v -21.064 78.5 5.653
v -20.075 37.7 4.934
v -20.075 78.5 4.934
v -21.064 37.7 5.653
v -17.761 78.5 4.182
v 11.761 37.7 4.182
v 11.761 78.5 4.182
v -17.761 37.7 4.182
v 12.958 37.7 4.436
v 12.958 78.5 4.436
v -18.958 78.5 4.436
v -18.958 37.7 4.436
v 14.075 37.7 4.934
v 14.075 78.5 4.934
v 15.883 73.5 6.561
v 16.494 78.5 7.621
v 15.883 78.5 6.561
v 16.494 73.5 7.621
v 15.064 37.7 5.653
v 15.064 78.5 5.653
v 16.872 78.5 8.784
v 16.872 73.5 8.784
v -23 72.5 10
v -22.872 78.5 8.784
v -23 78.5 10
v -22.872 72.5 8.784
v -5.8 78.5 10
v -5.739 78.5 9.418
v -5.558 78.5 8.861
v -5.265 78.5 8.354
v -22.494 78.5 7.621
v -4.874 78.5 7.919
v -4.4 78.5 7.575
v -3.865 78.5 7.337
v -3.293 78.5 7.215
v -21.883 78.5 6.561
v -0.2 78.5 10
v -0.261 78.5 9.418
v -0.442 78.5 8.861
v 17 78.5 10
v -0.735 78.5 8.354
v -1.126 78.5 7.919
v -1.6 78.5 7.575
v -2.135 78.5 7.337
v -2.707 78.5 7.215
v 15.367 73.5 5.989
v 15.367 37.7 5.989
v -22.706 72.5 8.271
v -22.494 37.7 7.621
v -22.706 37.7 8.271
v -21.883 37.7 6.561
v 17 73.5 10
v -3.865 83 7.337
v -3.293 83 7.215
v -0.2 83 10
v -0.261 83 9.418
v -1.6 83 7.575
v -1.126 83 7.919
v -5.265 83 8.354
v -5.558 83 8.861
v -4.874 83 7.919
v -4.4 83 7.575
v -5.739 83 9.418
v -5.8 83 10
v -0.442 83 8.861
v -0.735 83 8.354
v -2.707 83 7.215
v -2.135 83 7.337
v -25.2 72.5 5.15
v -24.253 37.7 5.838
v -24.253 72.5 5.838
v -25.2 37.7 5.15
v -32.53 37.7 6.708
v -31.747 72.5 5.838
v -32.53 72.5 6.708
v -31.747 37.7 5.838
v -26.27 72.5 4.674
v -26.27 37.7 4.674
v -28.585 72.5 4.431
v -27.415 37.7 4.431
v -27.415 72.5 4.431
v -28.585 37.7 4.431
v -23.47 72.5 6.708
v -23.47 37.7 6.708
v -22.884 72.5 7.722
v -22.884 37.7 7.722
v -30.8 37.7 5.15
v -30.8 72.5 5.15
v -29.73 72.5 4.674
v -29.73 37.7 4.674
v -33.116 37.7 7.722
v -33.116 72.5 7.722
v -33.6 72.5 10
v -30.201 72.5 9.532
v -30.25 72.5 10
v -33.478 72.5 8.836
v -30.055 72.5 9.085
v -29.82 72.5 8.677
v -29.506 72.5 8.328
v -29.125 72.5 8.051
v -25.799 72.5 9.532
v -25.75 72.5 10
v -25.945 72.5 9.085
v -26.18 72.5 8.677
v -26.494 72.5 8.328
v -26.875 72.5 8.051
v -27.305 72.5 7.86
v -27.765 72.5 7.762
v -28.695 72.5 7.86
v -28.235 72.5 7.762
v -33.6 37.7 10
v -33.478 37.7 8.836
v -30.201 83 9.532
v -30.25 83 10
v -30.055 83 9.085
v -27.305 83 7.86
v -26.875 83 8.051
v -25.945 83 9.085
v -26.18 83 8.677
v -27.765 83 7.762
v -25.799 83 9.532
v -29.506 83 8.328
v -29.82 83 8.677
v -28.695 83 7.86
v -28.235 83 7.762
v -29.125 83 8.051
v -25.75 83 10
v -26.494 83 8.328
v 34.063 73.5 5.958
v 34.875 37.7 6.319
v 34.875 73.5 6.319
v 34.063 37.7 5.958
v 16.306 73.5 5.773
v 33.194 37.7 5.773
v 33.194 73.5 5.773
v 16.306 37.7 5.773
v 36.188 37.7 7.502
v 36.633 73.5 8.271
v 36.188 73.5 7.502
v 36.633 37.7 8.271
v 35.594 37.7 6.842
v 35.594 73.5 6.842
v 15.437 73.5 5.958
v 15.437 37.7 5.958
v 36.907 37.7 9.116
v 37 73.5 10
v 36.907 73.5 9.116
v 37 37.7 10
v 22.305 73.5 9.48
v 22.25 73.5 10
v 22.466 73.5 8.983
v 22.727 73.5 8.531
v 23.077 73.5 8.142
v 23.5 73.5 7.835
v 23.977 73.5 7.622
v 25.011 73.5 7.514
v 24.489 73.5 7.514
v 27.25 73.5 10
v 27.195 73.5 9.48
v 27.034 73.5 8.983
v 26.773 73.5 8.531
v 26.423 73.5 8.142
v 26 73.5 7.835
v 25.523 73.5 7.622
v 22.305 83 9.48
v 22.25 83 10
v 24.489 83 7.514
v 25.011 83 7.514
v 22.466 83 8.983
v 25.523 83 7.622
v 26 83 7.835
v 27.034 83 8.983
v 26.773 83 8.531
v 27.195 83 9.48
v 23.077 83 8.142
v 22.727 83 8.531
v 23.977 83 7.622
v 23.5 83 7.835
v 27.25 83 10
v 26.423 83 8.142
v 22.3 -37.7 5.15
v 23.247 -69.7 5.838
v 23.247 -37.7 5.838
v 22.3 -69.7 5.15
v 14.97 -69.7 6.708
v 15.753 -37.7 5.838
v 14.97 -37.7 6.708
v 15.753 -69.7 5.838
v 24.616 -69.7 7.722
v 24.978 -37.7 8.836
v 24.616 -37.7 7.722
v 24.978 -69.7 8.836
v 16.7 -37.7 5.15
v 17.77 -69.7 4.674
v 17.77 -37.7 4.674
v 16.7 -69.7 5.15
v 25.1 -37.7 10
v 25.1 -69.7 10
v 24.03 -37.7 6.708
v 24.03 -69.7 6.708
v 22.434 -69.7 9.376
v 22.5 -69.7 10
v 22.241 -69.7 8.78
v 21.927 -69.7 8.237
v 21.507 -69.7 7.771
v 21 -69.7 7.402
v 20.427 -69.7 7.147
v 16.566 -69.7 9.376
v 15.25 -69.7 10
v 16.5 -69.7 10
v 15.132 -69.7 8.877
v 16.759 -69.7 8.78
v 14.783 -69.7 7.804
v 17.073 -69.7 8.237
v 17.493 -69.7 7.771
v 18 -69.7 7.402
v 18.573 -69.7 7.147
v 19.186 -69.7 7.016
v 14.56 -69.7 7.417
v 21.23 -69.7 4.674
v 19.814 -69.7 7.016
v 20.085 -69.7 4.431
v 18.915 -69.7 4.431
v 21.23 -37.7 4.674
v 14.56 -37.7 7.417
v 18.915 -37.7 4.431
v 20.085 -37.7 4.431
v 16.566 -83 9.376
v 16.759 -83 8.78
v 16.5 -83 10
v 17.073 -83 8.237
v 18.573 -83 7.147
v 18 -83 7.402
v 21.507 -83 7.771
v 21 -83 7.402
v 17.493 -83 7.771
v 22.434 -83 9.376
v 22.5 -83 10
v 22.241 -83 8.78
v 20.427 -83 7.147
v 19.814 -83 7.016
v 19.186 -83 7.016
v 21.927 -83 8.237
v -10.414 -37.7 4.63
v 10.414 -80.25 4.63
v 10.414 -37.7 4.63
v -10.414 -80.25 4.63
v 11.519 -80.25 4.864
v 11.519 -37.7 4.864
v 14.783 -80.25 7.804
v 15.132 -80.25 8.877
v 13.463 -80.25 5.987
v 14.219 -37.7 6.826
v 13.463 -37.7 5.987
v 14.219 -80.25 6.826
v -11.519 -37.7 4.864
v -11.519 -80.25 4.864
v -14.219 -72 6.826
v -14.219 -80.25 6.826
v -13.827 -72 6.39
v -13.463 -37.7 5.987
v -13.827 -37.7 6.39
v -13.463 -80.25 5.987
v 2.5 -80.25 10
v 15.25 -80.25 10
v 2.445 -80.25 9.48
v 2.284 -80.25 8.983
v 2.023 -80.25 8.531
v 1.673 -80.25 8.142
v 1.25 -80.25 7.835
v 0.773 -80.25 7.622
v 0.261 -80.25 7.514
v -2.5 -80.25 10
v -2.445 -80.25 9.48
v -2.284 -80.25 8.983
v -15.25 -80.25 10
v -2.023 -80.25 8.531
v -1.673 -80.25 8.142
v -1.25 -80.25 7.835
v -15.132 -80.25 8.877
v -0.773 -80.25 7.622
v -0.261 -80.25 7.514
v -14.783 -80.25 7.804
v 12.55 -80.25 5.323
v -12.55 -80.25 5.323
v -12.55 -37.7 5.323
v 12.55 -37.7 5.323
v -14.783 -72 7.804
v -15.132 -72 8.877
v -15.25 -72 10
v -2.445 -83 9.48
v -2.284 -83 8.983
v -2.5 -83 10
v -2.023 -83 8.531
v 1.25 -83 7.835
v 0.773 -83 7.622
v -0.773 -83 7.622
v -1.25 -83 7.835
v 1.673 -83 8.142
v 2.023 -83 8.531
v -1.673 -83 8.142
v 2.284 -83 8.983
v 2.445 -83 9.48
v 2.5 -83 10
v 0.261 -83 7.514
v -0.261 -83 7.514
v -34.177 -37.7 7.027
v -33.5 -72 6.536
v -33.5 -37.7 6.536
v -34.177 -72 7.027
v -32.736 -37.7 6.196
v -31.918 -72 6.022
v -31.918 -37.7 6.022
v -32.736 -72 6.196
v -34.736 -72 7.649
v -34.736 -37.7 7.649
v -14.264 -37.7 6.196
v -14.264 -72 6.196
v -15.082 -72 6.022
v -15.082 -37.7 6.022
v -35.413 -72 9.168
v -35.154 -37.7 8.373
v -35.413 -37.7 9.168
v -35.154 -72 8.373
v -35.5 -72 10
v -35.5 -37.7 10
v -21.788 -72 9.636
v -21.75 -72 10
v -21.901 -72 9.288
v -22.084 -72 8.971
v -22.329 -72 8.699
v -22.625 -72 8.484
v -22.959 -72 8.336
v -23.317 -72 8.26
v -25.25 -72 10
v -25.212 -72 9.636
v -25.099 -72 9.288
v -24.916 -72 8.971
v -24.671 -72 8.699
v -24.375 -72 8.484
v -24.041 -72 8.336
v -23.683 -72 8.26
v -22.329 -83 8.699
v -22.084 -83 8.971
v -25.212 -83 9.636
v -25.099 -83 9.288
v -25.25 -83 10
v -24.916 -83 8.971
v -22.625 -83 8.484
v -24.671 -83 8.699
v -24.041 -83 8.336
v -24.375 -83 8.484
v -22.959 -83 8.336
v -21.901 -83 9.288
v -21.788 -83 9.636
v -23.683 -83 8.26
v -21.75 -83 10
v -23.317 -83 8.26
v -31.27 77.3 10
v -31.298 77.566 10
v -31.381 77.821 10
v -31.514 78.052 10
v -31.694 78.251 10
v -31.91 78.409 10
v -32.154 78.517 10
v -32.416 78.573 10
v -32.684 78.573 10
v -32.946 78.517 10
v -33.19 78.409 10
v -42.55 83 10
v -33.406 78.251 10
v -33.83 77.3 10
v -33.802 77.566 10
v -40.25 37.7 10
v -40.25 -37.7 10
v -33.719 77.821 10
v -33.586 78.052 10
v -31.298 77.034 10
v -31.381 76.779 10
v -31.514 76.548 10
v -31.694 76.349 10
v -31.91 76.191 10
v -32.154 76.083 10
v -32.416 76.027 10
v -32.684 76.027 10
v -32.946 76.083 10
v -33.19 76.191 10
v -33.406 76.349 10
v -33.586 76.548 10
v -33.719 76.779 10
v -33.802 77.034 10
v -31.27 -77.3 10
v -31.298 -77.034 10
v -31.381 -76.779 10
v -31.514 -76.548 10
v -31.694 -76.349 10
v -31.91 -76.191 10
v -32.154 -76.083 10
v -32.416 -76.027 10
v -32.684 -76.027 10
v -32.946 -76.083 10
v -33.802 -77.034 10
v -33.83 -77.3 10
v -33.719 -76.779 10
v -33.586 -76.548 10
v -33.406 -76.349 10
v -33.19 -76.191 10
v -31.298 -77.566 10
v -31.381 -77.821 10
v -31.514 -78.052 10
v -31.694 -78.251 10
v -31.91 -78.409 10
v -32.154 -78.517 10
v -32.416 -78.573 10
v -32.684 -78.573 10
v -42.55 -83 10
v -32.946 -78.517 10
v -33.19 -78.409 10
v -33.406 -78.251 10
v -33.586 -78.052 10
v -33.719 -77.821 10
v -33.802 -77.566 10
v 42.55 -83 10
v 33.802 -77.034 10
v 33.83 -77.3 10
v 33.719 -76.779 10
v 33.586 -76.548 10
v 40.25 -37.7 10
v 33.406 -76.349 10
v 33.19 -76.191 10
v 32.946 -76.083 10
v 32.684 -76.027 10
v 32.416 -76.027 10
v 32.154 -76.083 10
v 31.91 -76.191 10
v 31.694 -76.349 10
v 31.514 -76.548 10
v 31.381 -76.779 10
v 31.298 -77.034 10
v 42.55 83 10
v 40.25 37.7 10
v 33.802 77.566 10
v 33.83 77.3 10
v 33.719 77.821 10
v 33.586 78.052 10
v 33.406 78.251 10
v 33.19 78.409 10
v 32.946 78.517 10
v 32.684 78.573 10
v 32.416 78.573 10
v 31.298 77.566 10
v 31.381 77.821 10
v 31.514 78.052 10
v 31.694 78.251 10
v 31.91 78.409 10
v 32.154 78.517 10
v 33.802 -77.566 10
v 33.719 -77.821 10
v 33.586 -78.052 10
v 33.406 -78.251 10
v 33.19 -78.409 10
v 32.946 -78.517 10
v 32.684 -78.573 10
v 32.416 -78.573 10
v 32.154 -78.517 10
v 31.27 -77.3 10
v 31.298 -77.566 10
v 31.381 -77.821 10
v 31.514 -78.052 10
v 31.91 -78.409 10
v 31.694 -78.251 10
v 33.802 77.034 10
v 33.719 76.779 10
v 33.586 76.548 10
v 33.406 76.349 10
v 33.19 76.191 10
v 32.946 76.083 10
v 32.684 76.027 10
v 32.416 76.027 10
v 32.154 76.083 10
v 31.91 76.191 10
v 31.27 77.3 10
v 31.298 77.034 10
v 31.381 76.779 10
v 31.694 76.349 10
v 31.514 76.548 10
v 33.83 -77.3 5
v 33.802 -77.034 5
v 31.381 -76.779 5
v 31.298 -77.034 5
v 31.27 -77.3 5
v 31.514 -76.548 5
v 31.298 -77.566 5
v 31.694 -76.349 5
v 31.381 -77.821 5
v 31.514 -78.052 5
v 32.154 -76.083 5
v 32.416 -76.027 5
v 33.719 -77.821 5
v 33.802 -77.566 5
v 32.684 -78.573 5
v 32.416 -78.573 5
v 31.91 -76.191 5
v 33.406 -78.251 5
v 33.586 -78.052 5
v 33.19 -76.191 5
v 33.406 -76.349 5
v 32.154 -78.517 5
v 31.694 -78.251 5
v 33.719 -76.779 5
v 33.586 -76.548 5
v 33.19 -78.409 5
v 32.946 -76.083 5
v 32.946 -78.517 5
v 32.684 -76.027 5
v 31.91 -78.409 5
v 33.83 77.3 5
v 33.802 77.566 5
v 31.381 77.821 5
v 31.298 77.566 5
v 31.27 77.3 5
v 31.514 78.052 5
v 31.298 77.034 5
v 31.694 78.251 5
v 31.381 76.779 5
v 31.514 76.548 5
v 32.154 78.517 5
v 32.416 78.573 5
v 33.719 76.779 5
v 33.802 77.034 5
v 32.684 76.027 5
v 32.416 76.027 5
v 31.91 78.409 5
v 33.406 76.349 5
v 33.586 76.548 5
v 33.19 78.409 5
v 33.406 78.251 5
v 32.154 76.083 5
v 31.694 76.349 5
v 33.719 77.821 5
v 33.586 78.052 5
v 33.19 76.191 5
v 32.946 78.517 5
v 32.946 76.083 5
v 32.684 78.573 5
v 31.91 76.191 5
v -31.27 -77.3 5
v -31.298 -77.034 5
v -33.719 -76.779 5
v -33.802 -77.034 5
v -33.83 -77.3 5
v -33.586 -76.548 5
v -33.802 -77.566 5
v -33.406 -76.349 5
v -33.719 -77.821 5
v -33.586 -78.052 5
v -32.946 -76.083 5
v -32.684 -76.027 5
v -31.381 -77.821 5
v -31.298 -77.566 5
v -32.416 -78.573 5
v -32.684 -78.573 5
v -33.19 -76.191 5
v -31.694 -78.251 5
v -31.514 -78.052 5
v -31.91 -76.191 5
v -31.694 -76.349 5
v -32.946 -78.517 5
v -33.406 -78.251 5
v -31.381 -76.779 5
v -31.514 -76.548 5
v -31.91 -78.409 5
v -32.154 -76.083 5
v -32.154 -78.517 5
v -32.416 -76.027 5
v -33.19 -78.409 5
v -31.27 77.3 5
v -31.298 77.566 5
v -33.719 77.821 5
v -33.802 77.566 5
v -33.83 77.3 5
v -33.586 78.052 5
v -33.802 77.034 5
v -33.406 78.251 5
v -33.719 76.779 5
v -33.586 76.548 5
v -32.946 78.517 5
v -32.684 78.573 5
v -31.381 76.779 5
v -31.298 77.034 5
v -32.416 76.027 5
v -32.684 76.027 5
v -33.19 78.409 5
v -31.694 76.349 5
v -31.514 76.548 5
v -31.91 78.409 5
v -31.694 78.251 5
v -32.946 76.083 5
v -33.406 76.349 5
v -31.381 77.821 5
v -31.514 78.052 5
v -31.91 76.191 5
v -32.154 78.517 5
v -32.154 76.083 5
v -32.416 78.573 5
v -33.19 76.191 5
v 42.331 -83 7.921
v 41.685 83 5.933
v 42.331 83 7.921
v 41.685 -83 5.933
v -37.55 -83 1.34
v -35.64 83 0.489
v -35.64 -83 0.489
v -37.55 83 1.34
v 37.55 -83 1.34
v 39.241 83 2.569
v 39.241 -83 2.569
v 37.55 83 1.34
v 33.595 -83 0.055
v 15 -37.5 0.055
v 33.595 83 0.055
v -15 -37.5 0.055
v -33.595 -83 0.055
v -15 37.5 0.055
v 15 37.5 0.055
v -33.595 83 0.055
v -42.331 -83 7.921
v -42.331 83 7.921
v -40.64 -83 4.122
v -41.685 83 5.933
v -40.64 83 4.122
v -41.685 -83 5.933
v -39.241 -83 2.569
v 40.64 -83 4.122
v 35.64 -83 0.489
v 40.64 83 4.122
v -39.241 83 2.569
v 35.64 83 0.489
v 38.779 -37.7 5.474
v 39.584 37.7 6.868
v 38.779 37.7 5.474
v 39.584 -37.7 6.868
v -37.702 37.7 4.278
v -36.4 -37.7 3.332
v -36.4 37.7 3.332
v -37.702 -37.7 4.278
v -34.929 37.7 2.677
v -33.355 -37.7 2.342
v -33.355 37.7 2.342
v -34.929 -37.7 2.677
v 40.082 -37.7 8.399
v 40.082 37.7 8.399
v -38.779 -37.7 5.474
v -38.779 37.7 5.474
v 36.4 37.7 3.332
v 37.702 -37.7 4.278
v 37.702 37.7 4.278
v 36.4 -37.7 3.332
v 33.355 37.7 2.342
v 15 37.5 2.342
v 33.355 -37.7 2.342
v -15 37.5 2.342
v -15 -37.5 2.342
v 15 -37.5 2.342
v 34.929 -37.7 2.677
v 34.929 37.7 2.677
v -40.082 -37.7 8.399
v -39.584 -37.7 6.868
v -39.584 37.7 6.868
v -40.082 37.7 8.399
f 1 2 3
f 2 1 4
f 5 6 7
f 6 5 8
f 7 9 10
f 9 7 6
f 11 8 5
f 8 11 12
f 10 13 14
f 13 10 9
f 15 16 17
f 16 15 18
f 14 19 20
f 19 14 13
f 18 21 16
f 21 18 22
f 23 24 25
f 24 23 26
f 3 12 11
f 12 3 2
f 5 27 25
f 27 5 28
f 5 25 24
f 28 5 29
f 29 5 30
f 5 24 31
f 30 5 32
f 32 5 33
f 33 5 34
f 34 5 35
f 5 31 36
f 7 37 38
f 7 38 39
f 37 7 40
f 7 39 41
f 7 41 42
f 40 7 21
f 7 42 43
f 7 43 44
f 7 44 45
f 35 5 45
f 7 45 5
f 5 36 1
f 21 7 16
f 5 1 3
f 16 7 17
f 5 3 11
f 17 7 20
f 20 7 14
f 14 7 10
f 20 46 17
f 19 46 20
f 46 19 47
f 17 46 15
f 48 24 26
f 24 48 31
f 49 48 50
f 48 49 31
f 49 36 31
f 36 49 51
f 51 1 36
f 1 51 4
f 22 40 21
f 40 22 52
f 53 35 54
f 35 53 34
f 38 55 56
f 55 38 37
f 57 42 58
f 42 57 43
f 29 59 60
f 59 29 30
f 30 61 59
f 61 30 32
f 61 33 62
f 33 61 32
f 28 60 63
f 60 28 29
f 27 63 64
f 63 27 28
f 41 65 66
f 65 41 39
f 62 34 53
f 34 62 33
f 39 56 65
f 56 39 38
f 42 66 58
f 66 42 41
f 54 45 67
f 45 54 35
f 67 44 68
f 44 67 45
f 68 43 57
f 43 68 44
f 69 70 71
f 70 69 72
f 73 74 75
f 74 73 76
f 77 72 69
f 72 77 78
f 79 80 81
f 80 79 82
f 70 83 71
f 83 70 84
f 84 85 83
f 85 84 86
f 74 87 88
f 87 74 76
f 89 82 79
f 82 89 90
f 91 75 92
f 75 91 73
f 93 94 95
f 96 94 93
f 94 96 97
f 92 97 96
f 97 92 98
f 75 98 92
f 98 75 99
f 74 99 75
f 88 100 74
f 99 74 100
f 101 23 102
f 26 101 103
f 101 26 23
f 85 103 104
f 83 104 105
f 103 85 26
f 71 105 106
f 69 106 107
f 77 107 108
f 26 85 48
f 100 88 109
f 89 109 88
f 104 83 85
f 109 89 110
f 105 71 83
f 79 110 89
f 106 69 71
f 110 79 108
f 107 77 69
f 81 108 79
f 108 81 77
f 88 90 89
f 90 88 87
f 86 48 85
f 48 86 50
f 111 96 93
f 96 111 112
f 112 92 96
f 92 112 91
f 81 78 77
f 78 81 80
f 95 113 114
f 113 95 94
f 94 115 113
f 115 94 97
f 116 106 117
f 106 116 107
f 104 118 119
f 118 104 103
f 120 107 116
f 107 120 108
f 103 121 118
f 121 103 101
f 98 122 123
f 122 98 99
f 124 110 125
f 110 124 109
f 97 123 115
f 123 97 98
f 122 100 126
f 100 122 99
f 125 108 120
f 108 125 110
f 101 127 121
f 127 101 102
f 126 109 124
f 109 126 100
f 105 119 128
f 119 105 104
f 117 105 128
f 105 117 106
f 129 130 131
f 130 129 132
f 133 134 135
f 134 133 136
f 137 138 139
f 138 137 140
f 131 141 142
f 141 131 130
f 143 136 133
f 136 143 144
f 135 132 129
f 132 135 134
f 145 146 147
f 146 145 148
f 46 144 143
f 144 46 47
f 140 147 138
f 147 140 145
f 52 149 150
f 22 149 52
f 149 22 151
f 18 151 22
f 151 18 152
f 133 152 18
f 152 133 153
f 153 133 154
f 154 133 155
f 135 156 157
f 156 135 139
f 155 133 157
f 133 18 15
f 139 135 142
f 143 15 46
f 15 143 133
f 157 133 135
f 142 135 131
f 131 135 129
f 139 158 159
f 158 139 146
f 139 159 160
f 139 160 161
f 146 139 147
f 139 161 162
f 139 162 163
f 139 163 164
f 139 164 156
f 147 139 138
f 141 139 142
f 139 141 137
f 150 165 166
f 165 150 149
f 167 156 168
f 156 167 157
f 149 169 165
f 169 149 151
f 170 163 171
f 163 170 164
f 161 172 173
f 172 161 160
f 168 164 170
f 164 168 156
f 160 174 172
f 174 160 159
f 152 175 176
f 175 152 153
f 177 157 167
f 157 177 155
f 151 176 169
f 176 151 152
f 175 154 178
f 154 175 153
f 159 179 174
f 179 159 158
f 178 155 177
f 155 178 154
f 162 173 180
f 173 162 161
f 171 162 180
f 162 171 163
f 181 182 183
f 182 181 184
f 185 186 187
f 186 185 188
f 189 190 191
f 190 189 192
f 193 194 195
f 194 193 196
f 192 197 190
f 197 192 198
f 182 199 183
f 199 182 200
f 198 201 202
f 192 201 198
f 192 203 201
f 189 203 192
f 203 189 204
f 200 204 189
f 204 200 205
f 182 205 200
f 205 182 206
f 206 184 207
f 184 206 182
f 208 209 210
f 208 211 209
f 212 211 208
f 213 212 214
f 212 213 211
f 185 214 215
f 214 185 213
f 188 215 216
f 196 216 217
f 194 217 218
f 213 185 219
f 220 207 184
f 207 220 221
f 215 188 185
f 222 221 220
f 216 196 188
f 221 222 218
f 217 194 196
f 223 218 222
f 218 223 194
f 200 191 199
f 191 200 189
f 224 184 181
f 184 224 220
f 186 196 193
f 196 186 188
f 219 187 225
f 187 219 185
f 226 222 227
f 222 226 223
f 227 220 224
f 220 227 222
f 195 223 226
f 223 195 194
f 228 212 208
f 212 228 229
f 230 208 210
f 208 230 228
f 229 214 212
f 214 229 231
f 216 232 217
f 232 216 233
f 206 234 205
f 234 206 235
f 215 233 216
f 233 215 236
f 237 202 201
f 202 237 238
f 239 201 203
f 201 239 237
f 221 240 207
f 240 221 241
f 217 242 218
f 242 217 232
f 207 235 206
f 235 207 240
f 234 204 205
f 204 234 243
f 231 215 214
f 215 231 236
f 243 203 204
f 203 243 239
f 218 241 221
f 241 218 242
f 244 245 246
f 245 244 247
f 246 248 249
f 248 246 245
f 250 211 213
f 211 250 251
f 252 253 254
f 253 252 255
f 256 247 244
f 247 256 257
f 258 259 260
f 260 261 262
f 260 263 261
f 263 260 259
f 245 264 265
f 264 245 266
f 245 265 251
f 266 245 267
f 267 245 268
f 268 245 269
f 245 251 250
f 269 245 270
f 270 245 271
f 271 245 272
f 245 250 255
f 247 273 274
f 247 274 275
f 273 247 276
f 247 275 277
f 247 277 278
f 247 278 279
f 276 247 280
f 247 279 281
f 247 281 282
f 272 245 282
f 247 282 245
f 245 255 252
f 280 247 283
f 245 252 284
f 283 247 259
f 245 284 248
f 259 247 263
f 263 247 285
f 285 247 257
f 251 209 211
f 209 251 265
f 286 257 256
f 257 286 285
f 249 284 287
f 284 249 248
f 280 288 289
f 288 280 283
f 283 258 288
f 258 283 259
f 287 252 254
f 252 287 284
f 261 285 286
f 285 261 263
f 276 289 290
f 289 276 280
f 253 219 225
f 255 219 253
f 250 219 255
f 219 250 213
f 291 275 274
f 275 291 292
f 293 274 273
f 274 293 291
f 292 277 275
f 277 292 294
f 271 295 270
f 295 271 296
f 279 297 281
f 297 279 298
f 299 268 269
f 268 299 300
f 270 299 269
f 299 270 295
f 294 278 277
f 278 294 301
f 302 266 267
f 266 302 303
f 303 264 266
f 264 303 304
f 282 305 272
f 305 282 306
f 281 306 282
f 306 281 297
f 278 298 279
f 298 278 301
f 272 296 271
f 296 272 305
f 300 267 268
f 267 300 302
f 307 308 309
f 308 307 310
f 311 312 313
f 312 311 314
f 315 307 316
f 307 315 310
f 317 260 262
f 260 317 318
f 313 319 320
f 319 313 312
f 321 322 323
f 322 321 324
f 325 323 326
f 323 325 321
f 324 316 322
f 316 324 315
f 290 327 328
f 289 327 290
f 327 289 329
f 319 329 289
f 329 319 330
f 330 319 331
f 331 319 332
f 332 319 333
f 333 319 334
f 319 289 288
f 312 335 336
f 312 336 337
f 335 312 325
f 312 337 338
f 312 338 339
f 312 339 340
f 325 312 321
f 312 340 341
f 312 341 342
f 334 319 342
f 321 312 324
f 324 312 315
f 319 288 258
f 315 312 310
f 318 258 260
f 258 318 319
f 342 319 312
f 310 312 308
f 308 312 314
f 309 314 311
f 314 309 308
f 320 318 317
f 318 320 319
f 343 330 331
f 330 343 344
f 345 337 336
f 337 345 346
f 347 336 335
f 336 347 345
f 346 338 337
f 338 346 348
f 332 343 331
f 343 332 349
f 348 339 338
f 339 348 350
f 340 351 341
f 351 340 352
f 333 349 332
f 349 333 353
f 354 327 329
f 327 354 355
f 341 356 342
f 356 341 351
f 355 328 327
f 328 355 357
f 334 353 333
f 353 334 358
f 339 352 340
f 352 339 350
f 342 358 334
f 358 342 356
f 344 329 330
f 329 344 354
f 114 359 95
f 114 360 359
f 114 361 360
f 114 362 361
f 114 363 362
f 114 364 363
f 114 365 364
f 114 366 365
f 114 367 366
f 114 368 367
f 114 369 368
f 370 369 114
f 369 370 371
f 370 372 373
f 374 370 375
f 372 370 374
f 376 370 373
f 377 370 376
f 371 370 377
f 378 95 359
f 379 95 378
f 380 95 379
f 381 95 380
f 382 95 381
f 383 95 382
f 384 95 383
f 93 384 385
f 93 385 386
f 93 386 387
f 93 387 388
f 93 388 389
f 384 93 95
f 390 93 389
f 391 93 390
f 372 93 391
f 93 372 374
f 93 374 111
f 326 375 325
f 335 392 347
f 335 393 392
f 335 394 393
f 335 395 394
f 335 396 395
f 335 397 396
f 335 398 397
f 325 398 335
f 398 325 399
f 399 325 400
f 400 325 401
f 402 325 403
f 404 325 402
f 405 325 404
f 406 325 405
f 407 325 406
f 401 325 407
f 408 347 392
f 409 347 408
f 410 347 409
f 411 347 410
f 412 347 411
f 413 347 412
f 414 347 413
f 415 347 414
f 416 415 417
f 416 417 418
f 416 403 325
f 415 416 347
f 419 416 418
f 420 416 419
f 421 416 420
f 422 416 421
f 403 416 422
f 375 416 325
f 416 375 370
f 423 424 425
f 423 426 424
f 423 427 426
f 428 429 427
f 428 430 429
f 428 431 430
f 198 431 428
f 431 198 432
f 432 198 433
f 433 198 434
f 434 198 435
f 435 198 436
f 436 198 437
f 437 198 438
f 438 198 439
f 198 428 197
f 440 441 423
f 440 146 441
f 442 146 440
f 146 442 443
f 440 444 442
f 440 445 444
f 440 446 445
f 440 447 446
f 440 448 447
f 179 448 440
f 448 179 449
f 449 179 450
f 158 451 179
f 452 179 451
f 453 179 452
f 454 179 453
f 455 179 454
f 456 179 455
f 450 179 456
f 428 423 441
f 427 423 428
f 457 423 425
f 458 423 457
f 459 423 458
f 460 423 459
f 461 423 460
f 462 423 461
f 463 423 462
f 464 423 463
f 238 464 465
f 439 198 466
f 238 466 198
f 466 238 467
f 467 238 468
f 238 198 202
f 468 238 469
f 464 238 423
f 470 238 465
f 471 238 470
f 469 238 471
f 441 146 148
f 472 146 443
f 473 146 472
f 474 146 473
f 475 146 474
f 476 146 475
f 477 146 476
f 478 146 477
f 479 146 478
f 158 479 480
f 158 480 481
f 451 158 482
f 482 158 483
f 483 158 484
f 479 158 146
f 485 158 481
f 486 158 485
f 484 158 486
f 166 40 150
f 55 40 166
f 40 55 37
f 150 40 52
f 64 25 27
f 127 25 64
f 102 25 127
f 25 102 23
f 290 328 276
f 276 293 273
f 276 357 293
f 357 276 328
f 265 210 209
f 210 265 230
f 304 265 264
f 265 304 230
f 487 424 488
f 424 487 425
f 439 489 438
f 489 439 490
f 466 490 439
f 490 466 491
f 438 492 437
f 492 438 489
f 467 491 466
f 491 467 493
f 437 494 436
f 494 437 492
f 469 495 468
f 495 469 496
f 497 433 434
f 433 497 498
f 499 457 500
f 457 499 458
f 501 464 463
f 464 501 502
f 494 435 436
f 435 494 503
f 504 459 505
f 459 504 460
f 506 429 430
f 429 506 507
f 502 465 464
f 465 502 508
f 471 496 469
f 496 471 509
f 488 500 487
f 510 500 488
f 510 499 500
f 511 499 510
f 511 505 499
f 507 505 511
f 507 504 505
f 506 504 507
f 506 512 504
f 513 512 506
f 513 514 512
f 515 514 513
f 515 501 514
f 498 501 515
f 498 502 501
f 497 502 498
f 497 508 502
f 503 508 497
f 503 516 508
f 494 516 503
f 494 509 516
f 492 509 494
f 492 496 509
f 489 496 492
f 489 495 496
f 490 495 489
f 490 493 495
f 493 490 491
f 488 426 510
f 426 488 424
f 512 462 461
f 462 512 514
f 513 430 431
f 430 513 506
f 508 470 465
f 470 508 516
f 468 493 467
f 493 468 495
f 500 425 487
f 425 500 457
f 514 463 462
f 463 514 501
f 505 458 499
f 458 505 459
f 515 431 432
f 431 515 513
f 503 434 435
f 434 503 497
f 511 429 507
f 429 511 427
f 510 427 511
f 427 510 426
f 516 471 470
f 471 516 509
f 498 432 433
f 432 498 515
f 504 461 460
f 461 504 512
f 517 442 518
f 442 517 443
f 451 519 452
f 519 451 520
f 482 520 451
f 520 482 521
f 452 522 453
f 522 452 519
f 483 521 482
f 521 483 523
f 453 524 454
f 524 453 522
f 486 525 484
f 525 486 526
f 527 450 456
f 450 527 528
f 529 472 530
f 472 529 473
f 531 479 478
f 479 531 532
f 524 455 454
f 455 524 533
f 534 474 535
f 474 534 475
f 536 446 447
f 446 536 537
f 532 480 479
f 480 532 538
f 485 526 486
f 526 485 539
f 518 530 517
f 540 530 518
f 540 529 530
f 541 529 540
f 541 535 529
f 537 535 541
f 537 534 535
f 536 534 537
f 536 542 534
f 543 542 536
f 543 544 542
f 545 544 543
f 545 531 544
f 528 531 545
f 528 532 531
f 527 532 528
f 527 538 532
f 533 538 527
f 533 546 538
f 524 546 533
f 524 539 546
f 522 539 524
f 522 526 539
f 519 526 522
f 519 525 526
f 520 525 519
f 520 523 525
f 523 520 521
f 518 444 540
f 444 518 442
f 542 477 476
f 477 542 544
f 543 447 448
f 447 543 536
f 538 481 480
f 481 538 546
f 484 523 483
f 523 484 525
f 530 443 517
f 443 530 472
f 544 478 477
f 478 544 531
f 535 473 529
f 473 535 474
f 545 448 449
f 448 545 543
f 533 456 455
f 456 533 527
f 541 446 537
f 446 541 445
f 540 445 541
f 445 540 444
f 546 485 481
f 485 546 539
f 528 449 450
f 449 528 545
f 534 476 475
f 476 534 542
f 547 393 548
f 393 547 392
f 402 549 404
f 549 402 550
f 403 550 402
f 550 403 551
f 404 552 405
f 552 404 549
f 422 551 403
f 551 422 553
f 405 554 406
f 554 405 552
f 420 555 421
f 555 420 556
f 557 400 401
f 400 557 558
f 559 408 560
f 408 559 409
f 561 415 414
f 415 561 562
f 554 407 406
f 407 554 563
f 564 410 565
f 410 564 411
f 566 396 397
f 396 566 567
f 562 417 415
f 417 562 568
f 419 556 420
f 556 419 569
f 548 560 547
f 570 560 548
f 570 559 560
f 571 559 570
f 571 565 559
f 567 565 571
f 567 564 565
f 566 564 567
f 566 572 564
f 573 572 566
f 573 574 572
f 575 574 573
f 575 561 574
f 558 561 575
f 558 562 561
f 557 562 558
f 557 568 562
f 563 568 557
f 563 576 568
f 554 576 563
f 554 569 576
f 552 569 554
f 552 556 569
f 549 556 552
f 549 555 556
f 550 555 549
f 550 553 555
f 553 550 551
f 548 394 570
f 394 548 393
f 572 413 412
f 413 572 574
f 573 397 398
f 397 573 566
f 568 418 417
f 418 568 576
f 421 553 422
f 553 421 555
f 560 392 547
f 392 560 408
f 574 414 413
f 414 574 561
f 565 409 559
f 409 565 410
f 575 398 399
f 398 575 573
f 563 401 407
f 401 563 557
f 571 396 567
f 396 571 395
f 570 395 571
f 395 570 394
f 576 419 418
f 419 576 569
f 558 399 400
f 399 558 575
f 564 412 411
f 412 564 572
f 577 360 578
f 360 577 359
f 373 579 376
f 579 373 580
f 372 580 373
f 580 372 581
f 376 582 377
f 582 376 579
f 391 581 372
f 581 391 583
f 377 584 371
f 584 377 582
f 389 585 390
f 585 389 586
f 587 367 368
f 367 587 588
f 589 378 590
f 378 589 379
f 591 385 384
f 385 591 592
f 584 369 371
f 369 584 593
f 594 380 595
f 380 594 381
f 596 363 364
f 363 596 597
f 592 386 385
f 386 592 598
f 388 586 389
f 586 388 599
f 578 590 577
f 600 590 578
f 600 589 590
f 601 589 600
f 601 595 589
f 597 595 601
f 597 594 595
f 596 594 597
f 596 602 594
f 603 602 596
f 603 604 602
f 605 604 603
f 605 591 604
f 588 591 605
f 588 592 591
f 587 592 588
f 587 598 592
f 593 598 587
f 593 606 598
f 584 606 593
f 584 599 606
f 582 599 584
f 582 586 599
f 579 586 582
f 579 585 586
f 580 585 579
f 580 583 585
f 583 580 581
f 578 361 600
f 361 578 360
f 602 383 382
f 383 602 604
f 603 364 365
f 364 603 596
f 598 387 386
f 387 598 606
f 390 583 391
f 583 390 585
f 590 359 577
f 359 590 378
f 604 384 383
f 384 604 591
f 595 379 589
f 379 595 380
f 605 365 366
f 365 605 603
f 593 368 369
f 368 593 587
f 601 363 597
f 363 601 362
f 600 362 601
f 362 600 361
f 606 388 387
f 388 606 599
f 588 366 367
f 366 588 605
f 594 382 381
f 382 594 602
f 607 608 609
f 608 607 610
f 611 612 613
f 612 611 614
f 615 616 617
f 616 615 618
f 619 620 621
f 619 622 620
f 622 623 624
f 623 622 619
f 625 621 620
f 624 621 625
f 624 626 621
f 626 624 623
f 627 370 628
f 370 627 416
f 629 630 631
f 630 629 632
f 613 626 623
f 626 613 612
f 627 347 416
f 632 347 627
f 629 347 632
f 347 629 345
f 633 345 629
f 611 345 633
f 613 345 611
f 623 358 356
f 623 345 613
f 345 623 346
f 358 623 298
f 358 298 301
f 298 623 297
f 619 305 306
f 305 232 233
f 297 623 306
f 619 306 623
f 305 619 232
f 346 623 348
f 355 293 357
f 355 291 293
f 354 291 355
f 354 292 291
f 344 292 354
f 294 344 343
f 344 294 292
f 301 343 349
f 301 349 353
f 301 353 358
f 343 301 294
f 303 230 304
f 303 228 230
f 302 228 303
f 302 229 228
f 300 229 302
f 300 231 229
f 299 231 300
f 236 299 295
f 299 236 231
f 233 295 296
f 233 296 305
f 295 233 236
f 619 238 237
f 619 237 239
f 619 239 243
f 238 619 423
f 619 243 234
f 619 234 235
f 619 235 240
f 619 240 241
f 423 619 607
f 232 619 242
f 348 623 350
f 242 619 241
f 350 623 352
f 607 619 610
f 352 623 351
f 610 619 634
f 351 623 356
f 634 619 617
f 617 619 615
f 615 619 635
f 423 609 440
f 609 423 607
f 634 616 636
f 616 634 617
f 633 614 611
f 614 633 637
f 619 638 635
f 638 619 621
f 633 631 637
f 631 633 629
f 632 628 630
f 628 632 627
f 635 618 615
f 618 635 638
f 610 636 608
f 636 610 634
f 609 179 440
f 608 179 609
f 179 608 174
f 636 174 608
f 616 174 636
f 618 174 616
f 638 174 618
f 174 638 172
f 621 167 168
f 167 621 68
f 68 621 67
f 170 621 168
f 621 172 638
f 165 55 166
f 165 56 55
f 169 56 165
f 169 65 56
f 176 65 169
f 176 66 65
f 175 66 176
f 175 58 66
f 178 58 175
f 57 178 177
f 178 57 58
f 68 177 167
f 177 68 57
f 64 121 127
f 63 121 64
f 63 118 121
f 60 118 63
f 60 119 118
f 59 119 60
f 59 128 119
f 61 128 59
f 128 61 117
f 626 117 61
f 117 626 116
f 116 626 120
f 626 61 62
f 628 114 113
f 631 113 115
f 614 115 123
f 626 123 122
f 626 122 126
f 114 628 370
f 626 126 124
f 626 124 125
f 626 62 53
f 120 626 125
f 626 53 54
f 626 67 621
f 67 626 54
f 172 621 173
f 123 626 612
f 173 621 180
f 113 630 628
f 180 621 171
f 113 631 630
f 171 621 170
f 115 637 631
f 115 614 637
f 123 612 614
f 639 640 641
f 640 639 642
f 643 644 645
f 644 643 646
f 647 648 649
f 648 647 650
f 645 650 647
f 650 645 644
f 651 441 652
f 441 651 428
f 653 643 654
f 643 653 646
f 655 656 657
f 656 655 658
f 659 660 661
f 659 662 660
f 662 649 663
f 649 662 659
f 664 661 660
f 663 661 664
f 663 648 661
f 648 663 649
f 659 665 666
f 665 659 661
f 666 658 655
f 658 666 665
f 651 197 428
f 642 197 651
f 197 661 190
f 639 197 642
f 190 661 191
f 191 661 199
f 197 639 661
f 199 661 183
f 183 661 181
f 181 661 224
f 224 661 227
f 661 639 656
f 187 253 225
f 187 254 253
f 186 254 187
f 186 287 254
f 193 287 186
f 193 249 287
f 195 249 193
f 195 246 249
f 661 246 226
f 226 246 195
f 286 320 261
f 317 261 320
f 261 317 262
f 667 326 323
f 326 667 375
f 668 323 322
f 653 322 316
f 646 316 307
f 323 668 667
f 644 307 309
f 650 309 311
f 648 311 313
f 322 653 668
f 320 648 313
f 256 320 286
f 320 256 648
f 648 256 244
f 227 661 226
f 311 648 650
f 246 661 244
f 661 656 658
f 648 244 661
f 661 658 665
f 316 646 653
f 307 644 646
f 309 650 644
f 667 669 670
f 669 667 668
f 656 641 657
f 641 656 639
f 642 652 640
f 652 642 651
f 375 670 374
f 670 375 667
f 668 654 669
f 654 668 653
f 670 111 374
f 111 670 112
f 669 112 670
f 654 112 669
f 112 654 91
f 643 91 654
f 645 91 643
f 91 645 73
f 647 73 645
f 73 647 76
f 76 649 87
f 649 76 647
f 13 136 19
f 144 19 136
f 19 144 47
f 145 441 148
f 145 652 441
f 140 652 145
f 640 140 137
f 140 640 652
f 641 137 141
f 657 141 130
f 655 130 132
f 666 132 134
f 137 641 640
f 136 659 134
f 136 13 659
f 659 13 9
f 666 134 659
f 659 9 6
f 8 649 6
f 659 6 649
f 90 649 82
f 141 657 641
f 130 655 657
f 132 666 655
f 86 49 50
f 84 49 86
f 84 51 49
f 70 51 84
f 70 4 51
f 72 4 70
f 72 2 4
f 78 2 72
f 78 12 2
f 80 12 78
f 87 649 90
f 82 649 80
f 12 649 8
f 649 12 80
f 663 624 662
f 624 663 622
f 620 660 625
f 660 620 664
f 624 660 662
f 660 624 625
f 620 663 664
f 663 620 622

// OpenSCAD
part = "bottom"; // [top: Box Top, bottom: Box Bottom, both: Both Pieces]

cableSet = "both"; // [base: Just HDK, audio: Add Audio, USB: Add USB, both: Add Both]

// Diameter of screwholes
screwSize = 3.2;

// Thickness of material
thickness = 2.5;

/* [Hidden] */
$fn=30;
baseDepth = 15; // how thick the cable pack is
baseWidth = 80.1 - baseDepth; // how wide the centers of the radii are
baseHeight = 75; // height of the cable pack (no cables installed)
cableClearance = 43; // clearance needed at both ends for the cables

xHDK = 3;
cableWidthHDK = 40;
cableHeightHDK = 41;
cableDepthHDK = 11.7;
cableDiamHDK = 5.6; // cable thickness for headset

xHDMI = 0;
cableWidthHDMI = 30.5;
cableHeightHDMI = 42.75;
cableDepthHDMI = 10.8;
cableDiamHDMI = 5; // cable thickness for HDMI cable

xUSBin = 23.5;
cableWidthUSBin = 24;
cableHeightUSBin = 34.5;
cableDepthUSBin = 8;
cableDiamUSBin = 3.5; // cable thickness for USB cable

xPower = -19.5;
cableWidthPower = 11.2;
cableHeightPower = 32.2;
cableDepthPower = 11.2;
cableDiamPower = 6; // cable thickness for Power cables

xUSBout = -24.75;
cableWidthUSBout = 24.5;
cableHeightUSBout = 36;
cableDepthUSBout = 8.5;
cableDiamUSBout = 5; // cable thickness for USB cable

xAudio = 28;
cableWidthAudio = 11.2;
cableHeightAudio = 35;
cableDepthAudio = 11.2;
cableDiamAudio = 4.5;


boxDepth = baseDepth + 2*thickness;
boxWidth = baseWidth;
boxHeight = baseHeight + 2*cableClearance + 2*thickness; // added size for the cables.

if (part == "top")
    boxTop();
else if (part == "bottom")
    boxBot();
else
{
    translate([-(boxWidth/2+5*thickness),0,0]) boxTop();
    translate([(boxWidth/2+5*thickness),0,0]) boxBot();
}


module boxTop()
{
    difference()
    {
        translate([0,0,boxDepth/2]) fullBox();
        translate([0,0,boxDepth]) cube([boxWidth+boxDepth+.1,boxHeight+.1,boxDepth], center=true);
    }
}

module boxBot()
{
    difference()
    {
        translate([0,0,boxDepth/2]) rotate([0,180,0]) fullBox();
        translate([0,0,boxDepth]) cube([boxWidth+boxDepth+.1,boxHeight+.1,boxDepth], center=true);
    }
}

module fullBox()
{
    difference()
    {
        rotate([90,0,0]) 
        hull() // exterior of box
        {
            translate([-boxWidth/2,0,0]) cylinder(d=boxDepth, h=boxHeight, center=true);
            translate([boxWidth/2, 0,0]) cylinder(d=boxDepth, h=boxHeight, center=true);
        }
        
        rotate([90,0,0]) 
        hull() // room for base box
        {
            translate([-baseWidth/2,0,0]) cylinder(d=baseDepth+.4, h=baseHeight+.4, center=true);
            translate([baseWidth/2,0,0]) cylinder(d=baseDepth+.4, h=baseHeight+.4, center=true);
        }
             
        // remove space for top cables
        translate([0,baseHeight/2,0])
        rotate([-90,0,0])
        {
            translate([xHDK,0,0]) cableSpace(cableWidthHDK,cableHeightHDK,cableDepthHDK,cableDiamHDK);
            if (cableSet == "audio" || cableSet == "both") translate([xAudio,0,0]) cableSpace(cableWidthAudio,cableHeightAudio,cableDepthAudio,cableDiamAudio);
            if (cableSet == "USB" || cableSet == "both") translate([xUSBout,0,0]) cableSpace(cableWidthUSBout,cableHeightUSBout,cableDepthUSBout,cableDiamUSBout);
        }
        
        // remove space for bottom cables
        translate([0,-baseHeight/2,0])
        rotate([90,0,0])
        {
            translate([xPower,0,0]) cableSpace(cableWidthPower,cableHeightPower,cableDepthPower,cableDiamPower);
            translate([xHDMI,0,0]) cableSpace(cableWidthHDMI,cableHeightHDMI,cableDepthHDMI,cableDiamHDMI);
            translate([xUSBin,0,0]) cableSpace(cableWidthUSBin,cableHeightUSBin,cableDepthUSBin,cableDiamUSBin);
        }
        
        // window for belt clip
        translate([0,0,baseDepth/2]) cube([30,baseHeight,thickness*3], center=true);
        
        // add screws
        translate([0,0,-boxDepth/2])
        {
            translate([-(boxWidth/2),-(boxHeight/2-thickness-screwSize),0])
            {
                counterSunk(screwSize,boxDepth/2);
                cylinder(d=screwSize*.8,h=boxDepth-2*thickness);
            }
            translate([-(boxWidth/2),(boxHeight/2-thickness-screwSize),0])
            {
                counterSunk(screwSize,boxDepth/2);
                cylinder(d=screwSize*.8,h=boxDepth-2*thickness);
            }
            translate([(boxWidth/2),-(boxHeight/2-thickness-screwSize),0])
            {
                counterSunk(screwSize,boxDepth/2);
                cylinder(d=screwSize*.8,h=boxDepth-2*thickness);
            }
            translate([(boxWidth/2),(boxHeight/2-thickness-screwSize),0])
            {
                counterSunk(screwSize,boxDepth/2);
                cylinder(d=screwSize*.8,h=boxDepth-2*thickness);
            }
        }
    }
    
    
}
module cableSpace(width,height,depth,cable)
{
    hull()
    {
        translate([-(width-depth)/2,0,0]) cylinder(d=depth,h=height);
        translate([(width-depth)/2,0,0]) cylinder(d=depth,h=height);
    }
    translate([0,0,height-.1]) cylinder(d=cable,h=height*2);
}

module counterSunk(holeSize = screwSize, length = 10)
{
    hull()
    {
        translate([0,0,-1]) cylinder(d=holeSize*2,h=2,center=true);
        translate([0,0,holeSize/2]) cylinder(d=holeSize,h=.1,center=true);
    }     
    cylinder(d=holeSize,h=length);
}
